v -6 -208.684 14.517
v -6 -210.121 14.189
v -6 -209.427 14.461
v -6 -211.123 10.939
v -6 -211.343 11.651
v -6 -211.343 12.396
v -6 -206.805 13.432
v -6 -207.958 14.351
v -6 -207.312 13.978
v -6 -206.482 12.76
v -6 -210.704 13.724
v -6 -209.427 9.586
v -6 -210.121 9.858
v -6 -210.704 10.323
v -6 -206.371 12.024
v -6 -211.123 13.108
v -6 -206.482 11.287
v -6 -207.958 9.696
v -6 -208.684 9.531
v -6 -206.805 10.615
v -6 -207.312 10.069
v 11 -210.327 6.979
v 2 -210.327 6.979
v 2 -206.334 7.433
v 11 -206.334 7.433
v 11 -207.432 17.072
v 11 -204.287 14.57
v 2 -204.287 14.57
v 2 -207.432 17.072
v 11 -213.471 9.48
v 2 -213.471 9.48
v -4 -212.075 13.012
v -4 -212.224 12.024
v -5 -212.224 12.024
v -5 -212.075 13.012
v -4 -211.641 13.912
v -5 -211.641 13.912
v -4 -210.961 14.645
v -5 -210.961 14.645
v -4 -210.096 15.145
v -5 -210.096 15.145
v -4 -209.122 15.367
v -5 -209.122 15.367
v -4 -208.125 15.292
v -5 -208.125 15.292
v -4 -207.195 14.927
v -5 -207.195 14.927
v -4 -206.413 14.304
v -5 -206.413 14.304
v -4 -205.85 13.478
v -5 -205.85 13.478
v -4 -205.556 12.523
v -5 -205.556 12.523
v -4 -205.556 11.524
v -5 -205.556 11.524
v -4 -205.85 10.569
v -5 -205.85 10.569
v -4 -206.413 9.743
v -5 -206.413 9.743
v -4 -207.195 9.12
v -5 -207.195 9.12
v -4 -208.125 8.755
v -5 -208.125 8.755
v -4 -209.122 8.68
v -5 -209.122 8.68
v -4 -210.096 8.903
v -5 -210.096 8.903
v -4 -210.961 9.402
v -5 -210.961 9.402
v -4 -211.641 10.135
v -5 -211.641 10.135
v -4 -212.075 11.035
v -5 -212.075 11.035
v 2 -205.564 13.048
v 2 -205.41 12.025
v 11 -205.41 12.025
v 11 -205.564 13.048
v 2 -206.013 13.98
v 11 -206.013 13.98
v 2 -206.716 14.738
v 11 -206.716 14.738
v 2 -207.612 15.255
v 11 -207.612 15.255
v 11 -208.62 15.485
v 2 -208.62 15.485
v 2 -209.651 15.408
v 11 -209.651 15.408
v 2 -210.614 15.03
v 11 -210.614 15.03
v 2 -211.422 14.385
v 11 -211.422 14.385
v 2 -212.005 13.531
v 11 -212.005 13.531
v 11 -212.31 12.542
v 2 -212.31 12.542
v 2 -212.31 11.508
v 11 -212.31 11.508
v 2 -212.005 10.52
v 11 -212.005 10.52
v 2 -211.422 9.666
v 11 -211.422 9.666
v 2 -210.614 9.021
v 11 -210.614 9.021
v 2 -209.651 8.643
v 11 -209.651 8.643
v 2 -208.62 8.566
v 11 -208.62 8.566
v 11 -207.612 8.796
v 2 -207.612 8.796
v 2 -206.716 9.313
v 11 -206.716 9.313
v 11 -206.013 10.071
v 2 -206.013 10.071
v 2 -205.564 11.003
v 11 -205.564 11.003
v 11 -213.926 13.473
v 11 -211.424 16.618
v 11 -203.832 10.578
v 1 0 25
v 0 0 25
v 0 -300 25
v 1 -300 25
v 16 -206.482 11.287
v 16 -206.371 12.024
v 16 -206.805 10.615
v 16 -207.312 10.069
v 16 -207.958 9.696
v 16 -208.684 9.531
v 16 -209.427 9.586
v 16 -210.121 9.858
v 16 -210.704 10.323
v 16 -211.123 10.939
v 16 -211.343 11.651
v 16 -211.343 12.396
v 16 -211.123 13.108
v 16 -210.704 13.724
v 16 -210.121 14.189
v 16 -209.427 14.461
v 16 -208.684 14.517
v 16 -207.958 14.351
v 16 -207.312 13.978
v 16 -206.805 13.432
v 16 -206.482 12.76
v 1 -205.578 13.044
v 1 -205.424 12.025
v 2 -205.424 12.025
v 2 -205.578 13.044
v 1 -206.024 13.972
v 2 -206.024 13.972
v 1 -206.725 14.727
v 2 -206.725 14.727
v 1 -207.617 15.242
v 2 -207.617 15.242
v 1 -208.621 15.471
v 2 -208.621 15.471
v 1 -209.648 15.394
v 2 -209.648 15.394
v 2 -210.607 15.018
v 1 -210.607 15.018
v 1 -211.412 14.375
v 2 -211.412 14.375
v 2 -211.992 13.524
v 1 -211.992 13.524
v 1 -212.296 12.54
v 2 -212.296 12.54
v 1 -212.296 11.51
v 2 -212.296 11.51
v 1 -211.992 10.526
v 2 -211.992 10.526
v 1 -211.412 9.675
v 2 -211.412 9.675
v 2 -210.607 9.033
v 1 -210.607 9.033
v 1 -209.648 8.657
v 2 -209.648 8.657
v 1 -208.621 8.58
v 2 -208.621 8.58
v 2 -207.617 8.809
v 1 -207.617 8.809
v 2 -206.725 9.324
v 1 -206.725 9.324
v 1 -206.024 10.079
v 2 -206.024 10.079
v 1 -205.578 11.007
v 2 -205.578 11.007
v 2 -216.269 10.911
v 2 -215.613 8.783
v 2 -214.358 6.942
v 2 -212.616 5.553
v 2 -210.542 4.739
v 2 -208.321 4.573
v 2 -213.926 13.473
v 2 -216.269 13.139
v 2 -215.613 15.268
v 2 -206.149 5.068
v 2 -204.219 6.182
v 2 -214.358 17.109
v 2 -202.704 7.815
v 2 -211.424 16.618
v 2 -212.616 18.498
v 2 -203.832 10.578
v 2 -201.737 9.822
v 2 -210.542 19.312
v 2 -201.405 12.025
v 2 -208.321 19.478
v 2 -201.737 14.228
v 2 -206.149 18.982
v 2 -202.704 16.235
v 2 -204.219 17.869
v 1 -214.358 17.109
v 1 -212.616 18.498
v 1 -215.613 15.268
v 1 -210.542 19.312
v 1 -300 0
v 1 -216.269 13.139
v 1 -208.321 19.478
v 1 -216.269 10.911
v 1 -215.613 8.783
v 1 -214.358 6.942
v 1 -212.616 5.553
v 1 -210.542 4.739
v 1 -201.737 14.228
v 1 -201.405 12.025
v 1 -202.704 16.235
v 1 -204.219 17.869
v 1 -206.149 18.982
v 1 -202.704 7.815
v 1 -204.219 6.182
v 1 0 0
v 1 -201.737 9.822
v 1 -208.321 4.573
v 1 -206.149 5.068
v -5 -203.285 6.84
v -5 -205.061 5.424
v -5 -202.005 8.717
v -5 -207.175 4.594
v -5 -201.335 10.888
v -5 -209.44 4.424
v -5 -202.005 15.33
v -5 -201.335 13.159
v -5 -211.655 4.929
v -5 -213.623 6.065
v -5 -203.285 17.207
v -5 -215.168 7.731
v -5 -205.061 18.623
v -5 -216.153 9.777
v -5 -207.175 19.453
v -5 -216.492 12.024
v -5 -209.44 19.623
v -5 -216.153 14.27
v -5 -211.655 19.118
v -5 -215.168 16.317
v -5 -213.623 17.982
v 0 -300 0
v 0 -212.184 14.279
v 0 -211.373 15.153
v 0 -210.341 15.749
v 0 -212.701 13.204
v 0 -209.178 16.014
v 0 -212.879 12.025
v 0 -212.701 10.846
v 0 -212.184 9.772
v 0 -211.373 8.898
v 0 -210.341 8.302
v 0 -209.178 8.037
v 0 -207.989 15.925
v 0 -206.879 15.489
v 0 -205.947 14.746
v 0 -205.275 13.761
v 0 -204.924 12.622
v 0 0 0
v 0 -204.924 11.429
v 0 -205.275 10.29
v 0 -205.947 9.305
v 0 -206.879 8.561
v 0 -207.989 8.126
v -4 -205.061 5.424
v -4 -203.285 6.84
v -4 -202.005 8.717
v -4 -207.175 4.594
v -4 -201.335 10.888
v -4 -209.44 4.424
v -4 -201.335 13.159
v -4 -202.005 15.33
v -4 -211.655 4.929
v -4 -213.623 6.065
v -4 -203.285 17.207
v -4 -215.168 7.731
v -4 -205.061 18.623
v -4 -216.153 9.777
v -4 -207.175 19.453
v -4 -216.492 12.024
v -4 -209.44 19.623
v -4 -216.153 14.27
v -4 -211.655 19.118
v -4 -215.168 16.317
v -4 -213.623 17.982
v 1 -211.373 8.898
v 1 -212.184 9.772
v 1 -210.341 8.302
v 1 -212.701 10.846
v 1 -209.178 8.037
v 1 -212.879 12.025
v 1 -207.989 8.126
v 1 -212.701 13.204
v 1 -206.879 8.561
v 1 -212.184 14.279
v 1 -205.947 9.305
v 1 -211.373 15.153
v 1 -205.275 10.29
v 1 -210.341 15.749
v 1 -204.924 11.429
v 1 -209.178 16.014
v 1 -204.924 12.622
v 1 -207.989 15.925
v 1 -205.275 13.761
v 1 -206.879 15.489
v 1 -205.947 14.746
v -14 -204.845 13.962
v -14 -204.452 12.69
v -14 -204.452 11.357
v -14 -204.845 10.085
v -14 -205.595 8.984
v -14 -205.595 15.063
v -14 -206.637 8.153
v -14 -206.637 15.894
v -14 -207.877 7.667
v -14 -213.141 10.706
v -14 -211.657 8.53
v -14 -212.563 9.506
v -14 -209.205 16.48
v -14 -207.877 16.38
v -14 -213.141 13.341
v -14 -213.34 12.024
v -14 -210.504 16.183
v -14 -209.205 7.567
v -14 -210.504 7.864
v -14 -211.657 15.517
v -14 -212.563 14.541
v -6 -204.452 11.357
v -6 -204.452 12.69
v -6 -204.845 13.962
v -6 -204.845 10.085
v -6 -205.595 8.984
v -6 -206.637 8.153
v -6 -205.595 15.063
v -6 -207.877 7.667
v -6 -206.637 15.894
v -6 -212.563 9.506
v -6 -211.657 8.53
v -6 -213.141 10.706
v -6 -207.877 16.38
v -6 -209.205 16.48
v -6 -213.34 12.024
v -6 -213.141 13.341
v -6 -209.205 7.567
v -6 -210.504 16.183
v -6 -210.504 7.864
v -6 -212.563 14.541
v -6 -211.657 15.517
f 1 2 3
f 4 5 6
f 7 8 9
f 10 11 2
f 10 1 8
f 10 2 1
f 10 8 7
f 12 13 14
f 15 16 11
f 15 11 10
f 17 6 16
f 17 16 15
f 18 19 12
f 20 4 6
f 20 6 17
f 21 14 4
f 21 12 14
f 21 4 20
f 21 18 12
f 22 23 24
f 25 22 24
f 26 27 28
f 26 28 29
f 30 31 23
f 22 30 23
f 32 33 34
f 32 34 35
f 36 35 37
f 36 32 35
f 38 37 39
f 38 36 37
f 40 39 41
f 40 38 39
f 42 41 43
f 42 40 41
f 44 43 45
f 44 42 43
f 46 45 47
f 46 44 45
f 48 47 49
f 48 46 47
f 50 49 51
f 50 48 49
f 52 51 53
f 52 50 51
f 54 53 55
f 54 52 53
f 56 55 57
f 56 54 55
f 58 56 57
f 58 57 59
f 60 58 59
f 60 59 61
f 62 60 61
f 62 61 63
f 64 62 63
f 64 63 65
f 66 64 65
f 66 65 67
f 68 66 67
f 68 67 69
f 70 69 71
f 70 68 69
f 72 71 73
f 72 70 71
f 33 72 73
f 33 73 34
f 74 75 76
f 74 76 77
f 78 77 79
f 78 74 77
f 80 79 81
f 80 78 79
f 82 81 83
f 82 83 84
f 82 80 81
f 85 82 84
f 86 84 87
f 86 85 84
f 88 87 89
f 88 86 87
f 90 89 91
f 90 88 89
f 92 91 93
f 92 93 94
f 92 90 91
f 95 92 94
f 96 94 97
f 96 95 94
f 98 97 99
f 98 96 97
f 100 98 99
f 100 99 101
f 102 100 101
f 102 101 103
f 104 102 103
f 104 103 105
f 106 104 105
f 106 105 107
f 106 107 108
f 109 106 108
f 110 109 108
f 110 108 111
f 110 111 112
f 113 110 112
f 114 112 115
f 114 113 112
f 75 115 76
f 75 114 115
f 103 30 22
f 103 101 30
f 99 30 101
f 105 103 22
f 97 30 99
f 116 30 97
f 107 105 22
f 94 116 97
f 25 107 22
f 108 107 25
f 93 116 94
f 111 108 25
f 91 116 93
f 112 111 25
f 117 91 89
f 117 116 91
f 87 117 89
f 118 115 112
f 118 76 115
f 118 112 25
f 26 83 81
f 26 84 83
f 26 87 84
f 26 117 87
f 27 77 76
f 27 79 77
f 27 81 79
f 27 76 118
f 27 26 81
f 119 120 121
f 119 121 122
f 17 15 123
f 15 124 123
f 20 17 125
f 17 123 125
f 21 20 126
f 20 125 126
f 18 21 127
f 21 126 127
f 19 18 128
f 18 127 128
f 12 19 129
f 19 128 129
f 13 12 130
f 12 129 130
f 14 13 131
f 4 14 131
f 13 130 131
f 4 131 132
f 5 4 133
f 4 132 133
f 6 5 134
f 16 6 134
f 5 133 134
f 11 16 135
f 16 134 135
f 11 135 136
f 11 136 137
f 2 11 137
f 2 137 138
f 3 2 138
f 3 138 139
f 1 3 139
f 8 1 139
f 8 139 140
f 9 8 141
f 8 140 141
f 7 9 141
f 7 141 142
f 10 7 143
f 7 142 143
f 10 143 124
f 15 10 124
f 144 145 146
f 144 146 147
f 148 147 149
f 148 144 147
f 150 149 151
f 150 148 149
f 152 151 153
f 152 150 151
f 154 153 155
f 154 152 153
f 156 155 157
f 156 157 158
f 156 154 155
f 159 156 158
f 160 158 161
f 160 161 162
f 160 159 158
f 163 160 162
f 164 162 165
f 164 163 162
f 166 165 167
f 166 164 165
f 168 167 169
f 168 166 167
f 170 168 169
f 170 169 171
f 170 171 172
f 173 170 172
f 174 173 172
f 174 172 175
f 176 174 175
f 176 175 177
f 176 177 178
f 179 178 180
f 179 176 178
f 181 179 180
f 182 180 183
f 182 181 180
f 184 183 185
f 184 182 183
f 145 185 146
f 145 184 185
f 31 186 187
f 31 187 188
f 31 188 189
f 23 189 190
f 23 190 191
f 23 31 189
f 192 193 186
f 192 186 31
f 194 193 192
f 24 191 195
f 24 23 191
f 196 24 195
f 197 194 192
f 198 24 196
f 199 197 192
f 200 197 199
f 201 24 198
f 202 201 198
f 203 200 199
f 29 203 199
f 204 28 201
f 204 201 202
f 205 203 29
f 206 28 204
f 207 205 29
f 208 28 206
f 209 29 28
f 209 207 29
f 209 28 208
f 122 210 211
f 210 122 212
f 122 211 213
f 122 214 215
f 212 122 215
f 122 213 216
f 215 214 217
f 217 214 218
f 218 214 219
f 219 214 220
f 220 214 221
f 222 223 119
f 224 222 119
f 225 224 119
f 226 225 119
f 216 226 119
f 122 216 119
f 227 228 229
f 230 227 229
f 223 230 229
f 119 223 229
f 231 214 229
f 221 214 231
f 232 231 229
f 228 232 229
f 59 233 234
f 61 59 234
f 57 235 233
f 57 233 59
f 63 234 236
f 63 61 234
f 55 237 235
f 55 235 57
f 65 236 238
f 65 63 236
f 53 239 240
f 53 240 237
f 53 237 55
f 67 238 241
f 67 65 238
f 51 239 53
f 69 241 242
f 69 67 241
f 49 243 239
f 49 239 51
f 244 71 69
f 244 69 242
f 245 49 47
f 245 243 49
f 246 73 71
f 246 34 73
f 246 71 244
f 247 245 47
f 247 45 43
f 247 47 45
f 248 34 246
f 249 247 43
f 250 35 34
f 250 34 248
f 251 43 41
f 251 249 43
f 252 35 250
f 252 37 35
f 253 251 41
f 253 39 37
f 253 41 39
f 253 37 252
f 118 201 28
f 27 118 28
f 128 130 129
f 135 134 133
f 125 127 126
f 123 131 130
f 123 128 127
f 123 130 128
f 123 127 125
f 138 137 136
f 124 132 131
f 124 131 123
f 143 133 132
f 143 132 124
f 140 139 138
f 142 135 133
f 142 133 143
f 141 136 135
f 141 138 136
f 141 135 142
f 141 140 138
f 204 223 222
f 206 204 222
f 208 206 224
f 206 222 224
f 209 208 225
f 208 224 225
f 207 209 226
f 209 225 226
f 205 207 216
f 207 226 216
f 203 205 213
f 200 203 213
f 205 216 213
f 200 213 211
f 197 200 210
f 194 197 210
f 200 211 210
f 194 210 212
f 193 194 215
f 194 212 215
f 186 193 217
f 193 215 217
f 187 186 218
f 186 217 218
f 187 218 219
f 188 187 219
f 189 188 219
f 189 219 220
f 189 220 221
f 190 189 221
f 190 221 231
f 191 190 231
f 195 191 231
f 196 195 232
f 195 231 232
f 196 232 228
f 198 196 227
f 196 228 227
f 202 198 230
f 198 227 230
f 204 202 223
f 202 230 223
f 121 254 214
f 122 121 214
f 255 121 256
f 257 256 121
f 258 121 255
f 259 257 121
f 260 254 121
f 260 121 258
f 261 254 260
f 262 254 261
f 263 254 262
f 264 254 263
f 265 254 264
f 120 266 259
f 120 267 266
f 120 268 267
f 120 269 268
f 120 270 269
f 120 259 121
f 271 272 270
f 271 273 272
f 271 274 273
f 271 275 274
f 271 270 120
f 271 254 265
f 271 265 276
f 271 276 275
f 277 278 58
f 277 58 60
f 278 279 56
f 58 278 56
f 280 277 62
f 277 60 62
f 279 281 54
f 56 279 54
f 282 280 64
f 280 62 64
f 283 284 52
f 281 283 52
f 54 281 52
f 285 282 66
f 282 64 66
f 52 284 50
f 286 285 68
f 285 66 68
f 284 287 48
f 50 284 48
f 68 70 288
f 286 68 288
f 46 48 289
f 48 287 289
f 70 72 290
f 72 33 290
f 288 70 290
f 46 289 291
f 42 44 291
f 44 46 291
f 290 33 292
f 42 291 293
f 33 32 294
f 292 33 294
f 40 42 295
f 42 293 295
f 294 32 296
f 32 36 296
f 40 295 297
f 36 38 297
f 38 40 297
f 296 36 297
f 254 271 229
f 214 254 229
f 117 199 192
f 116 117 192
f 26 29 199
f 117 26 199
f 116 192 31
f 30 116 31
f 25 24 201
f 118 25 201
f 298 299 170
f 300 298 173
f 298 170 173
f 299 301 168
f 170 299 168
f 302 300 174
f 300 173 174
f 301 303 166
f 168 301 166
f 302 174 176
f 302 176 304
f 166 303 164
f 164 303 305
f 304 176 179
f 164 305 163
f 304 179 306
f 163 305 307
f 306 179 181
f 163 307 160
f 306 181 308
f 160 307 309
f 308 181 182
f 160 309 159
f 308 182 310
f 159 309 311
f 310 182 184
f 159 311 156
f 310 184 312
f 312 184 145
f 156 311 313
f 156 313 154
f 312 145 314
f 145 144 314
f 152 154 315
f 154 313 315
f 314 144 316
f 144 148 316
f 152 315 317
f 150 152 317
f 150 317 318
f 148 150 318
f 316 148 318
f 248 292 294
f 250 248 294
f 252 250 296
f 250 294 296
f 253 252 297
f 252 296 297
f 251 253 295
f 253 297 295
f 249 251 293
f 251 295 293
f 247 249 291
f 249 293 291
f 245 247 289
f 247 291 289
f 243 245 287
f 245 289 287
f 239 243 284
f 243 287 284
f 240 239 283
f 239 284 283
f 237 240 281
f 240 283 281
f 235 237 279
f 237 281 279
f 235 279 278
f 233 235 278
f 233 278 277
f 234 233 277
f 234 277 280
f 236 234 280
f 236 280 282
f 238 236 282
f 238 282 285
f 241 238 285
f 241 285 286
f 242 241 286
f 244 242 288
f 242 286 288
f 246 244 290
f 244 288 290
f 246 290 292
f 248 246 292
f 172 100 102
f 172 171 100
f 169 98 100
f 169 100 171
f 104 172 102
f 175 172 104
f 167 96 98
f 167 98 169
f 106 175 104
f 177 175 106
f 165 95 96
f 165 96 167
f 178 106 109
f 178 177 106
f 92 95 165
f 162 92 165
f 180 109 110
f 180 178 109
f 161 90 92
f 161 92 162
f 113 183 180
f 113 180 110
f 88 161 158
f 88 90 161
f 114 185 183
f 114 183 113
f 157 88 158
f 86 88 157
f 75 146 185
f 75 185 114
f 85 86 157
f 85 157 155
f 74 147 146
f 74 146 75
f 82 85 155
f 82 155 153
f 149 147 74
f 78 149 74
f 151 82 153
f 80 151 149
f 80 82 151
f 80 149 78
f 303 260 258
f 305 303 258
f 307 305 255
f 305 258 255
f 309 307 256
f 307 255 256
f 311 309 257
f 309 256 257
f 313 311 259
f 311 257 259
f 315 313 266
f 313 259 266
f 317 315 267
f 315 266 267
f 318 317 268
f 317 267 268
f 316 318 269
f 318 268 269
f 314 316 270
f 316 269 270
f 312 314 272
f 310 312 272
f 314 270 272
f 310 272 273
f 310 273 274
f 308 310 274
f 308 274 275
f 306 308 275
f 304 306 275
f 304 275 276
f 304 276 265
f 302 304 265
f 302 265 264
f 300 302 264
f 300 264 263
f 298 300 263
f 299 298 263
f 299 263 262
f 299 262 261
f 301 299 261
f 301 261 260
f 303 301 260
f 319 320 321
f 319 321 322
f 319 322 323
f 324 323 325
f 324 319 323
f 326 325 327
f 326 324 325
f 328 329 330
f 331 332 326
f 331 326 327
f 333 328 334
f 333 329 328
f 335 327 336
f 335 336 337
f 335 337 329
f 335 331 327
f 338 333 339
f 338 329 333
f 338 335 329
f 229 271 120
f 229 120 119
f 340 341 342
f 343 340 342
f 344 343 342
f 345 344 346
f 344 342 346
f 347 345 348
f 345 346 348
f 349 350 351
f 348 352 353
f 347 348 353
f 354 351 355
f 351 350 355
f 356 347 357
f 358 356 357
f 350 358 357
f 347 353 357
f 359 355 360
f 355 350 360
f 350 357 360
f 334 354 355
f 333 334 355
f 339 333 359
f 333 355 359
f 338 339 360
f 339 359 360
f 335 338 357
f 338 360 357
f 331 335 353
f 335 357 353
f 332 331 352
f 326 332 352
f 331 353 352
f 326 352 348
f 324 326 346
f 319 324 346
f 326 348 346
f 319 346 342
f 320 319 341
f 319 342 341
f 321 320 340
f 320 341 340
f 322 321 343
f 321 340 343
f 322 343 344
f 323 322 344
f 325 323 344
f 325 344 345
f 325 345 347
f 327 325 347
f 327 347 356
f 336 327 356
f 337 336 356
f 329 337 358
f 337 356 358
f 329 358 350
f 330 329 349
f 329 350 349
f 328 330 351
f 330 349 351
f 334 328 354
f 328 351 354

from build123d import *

# Parameters (mm, degrees)
F0_W      = 1
F0_H      = 300
F1_DEPTH  = 25
F3_D      = 8
F4_R      = 2.5
F5_DEPTH  = 15
F5_FACE_R = 2.5
F6_DEPTH  = 5
F7_R      = 7.620853
F7_R_2    = 3.352765
F8_DEPTH  = 1
F6_FACE_R = 2.5
F9_DEPTH  = 2
F10_R     = 4.468724
F11_DEPTH = 8
F12_R     = 7.47374
F12_R_2   = 3.45507
F13_DEPTH = 1
F14_R     = 3.469246
F15_DEPTH = 9


with BuildPart() as f1:
    # F0 (on Top) → F1 (new body)
    with BuildSketch(Plane.XY):
        with Locations((0.5, -150)):
            Rectangle(F0_W, F0_H)
    extrude(amount=F1_DEPTH)

    # F3 (through all)
    with Locations(Plane.YZ.offset(1)):
        with Locations((-208.879188, 12.025342)):
            Hole(F3_D / 2)

    # F12 (on face) → F13 (join)
    with BuildSketch(Plane.YZ.offset(1)):
        with Locations((-208.879188, 12.025342)):
            Circle(F12_R)
        with Locations((-208.879188, 12.025342)):
            Circle(F12_R_2, mode=Mode.SUBTRACT)
    extrude(amount=F13_DEPTH)

    # F14 (on face) → F15 (join)
    with BuildSketch(Plane.YZ.offset(2)):
        Polygon((-204.28697, 14.570275), (-207.431539, 17.07207), (-211.424121, 16.61756), (-213.925915, 13.472991), (-213.471405, 9.480409), (-210.326837, 6.978615), (-206.334255, 7.433125), (-203.83246, 10.577693), align=None)
        with Locations((-208.879188, 12.025342)):
            Circle(F14_R, mode=Mode.SUBTRACT)
    extrude(amount=F15_DEPTH)


with BuildPart() as f5:
    # F4 (on face) → F5 (new body)
    with BuildSketch(Plane.YZ.offset(1)):
        with Locations((-208.870985, 12.023521)):
            Circle(F4_R)
    extrude(amount=F5_DEPTH)

    # F5_face (on face) → F6 (join)
    with BuildSketch(Plane(origin=(1, -208.870985, 12.023521), x_dir=(0, 1, 0), z_dir=(-1, 0, 0))):
        Circle(F5_FACE_R)
    extrude(amount=F6_DEPTH)

    # F6_face (on face) → F9 (join)
    with BuildSketch(Plane(origin=(-4, -208.870985, 12.023521), x_dir=(0, 1, 0), z_dir=(-1, 0, 0))):
        Circle(F6_FACE_R)
    extrude(amount=F9_DEPTH)


with BuildPart() as f8:
    # F7 (on face) → F8 (new body)
    with BuildSketch(Plane(origin=(-4, 0, 0), x_dir=(0, -1, 0), z_dir=(-1, 0, 0))):
        with Locations((208.870985, 12.023521)):
            Circle(F7_R)
        with Locations((208.870985, 12.023521)):
            Circle(F7_R_2, mode=Mode.SUBTRACT)
    extrude(amount=F8_DEPTH)


with BuildPart() as f11:
    # F10 (on face) → F11 (new body)
    with BuildSketch(Plane(origin=(-6, 0, 0), x_dir=(0, -1, 0), z_dir=(-1, 0, 0))):
        with Locations((208.870985, 12.023521)):
            Circle(F10_R)
    extrude(amount=F11_DEPTH)


solid = Compound([f1.part, f5.part, f8.part, f11.part])
